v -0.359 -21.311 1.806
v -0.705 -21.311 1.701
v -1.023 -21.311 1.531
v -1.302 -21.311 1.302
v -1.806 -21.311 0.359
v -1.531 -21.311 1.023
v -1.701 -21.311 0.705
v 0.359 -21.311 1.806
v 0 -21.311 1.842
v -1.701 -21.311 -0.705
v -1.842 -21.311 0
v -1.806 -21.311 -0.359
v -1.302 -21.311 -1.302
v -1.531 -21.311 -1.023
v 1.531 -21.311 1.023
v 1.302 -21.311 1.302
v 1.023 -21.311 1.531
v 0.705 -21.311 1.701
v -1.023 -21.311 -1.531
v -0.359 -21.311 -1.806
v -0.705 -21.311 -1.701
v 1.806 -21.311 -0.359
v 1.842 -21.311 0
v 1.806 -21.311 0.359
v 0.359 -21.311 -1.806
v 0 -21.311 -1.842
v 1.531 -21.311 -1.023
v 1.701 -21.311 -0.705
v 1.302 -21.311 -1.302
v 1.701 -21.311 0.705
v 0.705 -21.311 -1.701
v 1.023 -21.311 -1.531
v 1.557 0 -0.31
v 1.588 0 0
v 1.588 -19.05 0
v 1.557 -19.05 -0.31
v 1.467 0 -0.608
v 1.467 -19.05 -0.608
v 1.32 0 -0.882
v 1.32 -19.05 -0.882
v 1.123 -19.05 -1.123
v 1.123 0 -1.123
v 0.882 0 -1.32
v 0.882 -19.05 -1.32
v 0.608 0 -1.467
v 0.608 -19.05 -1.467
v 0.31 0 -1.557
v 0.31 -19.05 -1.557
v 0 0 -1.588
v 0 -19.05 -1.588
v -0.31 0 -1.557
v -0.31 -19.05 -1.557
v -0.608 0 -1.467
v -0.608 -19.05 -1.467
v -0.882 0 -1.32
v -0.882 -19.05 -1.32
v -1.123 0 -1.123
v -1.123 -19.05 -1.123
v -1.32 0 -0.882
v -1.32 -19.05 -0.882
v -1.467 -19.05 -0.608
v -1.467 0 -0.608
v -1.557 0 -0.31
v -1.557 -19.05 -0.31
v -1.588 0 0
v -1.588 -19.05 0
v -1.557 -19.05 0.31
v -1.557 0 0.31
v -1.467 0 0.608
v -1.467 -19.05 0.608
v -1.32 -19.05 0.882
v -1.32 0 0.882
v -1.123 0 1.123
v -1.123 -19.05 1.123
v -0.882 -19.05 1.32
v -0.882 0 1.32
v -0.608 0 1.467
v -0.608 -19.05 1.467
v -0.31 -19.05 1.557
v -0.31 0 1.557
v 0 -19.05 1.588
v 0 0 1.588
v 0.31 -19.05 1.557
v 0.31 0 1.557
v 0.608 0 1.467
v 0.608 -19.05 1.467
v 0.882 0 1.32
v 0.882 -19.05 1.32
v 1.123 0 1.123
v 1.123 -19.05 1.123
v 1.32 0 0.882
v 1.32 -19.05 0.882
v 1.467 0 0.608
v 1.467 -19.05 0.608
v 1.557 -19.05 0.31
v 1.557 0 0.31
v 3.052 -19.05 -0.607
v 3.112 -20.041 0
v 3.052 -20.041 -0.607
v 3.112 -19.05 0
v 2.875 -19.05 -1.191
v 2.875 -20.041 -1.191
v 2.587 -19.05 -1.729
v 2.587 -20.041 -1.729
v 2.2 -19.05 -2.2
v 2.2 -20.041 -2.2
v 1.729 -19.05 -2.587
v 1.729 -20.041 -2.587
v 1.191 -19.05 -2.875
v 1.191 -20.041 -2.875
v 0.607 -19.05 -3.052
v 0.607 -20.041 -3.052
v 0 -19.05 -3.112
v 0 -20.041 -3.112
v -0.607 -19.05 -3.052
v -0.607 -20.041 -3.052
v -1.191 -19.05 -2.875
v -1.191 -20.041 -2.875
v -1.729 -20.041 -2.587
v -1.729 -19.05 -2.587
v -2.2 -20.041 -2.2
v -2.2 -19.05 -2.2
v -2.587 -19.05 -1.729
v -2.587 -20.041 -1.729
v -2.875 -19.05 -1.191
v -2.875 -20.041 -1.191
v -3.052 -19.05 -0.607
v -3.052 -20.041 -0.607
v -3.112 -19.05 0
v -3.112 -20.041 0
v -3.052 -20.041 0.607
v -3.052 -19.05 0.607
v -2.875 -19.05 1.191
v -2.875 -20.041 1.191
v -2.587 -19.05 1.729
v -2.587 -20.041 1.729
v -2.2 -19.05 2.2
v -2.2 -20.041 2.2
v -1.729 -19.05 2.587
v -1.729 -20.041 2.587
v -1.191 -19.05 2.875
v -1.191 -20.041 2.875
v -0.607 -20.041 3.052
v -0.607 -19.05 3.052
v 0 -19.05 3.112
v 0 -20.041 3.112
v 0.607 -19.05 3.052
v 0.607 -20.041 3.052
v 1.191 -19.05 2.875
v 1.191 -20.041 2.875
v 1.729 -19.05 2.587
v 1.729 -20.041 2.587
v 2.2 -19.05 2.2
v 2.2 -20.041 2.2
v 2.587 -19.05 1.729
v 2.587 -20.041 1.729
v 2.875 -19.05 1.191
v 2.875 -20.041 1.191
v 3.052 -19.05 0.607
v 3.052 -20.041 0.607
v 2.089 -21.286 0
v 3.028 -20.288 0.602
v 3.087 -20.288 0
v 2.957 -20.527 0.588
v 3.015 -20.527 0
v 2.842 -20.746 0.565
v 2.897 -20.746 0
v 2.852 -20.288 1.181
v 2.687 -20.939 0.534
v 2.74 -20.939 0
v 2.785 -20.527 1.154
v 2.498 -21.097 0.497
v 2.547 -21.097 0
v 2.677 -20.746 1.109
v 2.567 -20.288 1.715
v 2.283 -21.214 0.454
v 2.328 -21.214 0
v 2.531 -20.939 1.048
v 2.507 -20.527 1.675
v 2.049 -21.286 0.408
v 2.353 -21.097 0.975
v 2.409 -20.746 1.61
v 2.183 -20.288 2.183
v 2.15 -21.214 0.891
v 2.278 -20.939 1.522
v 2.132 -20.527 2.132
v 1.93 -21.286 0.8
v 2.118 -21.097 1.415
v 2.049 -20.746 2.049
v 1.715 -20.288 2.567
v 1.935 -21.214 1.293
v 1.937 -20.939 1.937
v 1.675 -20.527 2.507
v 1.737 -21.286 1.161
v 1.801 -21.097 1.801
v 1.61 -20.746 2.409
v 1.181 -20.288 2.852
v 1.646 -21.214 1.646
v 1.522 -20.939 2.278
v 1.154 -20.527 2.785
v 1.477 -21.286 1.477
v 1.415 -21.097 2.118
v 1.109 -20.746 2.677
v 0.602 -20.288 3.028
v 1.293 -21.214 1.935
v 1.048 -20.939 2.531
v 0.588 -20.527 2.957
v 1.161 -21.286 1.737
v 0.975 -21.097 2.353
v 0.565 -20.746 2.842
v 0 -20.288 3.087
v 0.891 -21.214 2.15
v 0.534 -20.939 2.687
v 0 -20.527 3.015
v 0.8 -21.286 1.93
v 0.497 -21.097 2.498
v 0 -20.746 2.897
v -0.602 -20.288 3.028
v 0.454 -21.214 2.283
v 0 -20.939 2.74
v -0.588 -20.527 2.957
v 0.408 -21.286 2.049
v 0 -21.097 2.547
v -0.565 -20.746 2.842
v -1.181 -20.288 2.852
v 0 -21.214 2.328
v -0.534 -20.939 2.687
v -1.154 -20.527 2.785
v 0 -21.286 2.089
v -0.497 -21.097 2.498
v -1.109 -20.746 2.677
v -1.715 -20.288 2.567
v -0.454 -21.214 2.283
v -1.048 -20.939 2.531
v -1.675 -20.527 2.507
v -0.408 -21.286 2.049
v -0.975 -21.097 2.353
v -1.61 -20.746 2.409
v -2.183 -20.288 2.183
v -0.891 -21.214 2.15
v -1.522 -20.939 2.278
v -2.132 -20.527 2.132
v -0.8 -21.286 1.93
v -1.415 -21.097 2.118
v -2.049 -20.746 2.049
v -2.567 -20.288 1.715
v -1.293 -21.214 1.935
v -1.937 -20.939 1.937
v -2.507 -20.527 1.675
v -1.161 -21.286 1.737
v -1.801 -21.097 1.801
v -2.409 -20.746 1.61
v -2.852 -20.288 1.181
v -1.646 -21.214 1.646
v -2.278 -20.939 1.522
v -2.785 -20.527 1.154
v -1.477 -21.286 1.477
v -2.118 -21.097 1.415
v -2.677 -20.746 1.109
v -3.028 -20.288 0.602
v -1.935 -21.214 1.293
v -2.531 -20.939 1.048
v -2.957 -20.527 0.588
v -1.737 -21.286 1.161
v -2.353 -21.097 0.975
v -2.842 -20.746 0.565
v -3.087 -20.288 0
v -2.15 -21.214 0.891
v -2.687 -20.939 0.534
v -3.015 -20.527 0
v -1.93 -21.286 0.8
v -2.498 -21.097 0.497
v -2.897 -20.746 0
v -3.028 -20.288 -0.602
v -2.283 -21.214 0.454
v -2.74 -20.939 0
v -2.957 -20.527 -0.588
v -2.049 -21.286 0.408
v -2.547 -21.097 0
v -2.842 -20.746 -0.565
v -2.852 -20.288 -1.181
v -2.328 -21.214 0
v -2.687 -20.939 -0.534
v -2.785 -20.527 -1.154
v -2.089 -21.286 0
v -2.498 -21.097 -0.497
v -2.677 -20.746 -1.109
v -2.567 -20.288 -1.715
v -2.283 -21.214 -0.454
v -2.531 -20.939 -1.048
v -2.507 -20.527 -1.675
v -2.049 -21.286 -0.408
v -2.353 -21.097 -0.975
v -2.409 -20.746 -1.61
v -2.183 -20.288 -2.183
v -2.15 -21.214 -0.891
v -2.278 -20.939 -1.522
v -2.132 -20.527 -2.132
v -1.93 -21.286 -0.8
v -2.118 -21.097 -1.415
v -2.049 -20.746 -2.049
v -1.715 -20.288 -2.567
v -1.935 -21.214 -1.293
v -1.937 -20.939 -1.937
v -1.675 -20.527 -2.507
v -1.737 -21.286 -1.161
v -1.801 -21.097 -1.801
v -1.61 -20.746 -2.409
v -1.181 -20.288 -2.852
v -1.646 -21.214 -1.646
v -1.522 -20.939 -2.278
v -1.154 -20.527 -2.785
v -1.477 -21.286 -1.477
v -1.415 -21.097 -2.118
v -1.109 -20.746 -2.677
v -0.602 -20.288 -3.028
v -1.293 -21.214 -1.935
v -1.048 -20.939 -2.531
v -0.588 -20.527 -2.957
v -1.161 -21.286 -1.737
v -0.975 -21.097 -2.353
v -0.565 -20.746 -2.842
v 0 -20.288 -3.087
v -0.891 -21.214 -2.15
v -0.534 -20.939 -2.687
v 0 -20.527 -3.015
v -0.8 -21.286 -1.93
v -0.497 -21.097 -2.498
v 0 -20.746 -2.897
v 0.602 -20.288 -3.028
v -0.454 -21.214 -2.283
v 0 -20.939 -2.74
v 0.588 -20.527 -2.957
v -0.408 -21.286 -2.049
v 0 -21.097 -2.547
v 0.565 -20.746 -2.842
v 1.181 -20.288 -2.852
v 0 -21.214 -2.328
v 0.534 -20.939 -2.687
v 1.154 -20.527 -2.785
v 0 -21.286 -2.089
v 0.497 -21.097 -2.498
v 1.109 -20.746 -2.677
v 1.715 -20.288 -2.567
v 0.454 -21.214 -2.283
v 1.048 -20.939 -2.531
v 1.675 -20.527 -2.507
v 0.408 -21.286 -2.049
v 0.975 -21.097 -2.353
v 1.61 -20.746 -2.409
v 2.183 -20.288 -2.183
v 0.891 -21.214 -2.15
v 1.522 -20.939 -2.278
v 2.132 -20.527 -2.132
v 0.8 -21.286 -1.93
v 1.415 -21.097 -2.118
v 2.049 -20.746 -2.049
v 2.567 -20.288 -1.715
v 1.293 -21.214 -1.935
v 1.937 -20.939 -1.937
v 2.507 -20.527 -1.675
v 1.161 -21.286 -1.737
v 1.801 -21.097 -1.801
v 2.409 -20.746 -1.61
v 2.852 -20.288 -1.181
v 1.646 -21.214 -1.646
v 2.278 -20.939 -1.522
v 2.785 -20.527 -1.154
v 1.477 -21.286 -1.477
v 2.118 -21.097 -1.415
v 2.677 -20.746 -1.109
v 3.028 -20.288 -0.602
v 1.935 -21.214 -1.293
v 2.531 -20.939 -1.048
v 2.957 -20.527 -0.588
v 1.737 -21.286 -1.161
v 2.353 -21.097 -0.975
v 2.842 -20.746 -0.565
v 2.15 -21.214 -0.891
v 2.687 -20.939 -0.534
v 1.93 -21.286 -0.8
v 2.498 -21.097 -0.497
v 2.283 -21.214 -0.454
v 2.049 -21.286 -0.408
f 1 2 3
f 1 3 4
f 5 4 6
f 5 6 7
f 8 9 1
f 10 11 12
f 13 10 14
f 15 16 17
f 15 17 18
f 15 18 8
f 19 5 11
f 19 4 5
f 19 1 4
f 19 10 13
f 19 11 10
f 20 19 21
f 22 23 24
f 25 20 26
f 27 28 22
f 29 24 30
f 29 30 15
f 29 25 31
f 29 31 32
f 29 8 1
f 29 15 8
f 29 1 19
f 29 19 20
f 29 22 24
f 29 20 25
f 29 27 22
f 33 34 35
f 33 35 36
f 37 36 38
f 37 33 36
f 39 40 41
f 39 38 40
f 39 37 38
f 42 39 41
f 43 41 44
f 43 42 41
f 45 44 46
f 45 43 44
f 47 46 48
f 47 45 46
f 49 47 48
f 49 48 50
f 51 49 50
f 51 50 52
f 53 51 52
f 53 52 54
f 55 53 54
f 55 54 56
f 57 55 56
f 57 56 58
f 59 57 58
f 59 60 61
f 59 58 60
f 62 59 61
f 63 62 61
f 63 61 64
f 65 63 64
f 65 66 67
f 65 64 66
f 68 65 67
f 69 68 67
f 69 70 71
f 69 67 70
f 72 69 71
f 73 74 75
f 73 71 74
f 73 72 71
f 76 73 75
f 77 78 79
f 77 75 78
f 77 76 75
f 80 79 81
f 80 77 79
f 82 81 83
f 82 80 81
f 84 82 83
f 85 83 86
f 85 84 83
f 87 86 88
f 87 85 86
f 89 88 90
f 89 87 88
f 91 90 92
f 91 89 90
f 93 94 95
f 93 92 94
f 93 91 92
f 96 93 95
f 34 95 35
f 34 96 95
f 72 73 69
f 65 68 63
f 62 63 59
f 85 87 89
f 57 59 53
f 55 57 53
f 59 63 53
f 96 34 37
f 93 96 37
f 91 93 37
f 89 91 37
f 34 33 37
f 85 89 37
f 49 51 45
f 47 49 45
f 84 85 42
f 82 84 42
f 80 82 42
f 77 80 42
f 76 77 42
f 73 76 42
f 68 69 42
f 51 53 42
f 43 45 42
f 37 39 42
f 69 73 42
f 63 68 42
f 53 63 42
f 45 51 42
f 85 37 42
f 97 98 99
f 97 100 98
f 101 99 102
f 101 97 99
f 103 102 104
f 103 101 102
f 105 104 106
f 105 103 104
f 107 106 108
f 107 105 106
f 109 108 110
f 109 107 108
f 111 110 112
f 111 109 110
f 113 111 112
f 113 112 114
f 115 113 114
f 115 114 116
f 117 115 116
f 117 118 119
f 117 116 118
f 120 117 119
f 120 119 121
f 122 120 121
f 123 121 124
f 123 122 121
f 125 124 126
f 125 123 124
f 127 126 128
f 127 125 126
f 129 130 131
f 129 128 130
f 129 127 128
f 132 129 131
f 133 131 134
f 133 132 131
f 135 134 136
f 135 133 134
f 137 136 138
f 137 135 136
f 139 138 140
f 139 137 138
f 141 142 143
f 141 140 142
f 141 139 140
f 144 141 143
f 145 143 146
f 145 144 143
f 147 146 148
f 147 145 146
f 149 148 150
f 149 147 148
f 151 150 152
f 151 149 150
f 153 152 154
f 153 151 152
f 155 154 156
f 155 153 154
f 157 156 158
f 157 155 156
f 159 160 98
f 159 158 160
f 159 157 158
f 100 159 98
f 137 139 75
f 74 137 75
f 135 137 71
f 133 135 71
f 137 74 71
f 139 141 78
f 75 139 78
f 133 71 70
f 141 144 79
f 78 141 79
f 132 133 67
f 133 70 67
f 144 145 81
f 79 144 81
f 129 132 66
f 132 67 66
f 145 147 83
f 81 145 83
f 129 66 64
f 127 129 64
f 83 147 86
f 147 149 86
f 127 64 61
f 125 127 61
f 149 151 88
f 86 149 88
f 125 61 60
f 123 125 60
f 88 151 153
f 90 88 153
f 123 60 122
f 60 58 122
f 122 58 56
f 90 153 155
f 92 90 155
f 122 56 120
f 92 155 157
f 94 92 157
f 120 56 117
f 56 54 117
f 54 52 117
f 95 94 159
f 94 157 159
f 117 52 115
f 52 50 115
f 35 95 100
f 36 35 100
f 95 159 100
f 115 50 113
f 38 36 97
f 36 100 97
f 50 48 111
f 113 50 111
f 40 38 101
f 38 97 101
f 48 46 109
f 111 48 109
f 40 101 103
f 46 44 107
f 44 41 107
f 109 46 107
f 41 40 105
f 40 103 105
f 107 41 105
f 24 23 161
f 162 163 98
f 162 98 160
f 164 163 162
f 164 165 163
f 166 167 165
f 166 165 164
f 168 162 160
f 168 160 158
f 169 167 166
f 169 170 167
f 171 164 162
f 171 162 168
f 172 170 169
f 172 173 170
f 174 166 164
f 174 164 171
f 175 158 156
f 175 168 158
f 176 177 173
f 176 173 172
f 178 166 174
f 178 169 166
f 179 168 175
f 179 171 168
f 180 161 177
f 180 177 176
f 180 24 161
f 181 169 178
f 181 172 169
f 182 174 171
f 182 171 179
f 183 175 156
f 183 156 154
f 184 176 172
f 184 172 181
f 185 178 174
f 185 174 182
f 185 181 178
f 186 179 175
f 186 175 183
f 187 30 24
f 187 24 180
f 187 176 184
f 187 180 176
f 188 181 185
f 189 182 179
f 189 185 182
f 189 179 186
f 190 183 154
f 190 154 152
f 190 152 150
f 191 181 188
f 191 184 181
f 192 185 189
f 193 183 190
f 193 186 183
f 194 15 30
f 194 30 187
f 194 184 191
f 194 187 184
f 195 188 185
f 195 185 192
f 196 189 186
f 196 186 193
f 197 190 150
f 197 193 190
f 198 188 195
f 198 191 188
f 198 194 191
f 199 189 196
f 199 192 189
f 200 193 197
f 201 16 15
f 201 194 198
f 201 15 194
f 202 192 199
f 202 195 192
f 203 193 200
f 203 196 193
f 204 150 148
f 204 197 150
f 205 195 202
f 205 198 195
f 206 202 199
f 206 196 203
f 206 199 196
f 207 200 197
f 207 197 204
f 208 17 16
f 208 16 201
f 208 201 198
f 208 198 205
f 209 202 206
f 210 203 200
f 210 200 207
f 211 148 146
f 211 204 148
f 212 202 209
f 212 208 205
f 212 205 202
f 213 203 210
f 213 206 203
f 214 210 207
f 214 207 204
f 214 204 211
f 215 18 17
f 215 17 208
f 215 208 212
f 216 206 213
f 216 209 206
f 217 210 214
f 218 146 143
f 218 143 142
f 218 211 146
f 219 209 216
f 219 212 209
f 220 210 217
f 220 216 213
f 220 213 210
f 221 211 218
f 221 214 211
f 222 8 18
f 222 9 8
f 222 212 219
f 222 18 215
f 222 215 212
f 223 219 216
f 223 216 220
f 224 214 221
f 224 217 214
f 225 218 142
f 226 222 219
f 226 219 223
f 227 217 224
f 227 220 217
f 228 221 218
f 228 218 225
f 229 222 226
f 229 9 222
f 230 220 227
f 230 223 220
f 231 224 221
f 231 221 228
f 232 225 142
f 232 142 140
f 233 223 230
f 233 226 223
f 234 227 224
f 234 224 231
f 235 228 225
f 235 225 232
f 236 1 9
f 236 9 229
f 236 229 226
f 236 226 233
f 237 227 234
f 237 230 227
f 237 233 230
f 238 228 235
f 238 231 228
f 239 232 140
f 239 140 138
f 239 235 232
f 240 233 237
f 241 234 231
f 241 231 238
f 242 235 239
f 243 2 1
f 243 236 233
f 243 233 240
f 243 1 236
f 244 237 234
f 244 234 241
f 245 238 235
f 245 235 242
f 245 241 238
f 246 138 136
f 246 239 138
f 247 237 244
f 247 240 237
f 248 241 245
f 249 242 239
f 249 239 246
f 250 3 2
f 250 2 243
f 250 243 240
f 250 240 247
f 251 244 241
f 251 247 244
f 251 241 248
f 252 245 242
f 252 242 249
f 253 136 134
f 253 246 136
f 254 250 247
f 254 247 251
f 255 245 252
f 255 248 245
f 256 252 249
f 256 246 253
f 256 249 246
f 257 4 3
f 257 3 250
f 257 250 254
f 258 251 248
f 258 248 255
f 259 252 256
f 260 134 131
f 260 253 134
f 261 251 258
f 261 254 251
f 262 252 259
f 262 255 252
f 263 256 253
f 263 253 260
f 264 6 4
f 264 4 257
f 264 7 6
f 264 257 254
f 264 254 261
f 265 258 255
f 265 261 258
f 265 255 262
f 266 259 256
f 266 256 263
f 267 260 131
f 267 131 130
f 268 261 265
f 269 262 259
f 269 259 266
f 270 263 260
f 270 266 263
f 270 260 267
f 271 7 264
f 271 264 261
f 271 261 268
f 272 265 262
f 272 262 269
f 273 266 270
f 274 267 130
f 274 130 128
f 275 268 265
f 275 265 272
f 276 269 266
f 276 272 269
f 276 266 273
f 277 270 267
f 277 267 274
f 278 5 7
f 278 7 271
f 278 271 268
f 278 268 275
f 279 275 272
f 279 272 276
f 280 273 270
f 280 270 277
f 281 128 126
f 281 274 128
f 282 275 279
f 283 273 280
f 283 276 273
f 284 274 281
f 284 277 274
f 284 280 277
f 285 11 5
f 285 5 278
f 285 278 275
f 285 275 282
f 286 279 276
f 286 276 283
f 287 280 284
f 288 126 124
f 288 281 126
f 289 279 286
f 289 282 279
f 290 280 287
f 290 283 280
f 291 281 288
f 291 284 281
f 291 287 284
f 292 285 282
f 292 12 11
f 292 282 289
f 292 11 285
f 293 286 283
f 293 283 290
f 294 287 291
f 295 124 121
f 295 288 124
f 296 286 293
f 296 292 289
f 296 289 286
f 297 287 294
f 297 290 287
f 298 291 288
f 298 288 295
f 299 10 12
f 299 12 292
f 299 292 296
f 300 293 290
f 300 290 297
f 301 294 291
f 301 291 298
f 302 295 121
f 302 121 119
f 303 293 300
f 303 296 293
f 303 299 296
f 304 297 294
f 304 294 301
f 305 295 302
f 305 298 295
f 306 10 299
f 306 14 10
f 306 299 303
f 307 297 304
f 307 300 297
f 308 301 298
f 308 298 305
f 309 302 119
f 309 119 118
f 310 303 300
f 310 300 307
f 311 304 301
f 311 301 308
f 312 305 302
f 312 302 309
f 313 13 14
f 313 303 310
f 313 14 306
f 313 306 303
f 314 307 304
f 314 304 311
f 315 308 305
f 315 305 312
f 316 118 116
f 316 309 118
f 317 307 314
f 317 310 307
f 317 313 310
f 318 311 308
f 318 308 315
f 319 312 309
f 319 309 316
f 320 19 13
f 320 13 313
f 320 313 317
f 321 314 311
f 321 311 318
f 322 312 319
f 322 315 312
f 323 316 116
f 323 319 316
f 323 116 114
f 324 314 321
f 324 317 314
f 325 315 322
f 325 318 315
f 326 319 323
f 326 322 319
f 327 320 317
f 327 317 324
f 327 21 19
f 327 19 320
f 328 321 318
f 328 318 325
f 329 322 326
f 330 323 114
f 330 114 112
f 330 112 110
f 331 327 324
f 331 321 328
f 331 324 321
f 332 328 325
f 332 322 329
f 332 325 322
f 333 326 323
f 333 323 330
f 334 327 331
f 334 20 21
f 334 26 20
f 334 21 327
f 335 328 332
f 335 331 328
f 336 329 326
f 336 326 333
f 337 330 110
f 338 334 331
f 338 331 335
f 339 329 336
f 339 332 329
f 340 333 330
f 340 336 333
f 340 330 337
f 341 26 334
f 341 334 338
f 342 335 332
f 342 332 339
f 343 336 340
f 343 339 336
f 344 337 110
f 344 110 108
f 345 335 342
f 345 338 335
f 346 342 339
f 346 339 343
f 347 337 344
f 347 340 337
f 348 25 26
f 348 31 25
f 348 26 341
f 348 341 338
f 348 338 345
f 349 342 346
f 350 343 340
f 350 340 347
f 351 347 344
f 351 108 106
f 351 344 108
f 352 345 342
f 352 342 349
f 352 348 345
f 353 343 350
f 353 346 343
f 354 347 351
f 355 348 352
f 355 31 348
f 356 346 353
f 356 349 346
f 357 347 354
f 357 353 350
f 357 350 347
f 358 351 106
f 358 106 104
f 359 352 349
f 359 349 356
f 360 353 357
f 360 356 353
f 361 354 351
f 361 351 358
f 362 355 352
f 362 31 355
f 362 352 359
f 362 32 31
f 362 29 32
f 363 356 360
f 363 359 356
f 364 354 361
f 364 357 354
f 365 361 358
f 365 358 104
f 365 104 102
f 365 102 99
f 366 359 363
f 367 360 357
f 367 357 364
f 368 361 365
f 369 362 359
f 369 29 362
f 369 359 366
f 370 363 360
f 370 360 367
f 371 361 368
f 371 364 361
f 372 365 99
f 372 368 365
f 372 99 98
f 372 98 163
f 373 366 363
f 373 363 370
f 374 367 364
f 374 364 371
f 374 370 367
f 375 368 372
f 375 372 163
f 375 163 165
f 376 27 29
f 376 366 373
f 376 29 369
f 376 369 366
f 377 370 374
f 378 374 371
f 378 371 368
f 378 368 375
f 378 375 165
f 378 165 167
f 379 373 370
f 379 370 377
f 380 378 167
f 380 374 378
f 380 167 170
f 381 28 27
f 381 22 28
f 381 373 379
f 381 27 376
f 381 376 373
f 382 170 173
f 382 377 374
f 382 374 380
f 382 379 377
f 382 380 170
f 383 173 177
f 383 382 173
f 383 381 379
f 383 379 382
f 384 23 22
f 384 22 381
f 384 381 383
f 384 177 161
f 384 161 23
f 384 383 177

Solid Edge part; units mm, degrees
sketch "Sketch1" plane through (0, 0, 0) normal (0, -1, 0) x (1, 0, 0)
  circle A0 centre (0, 0) radius 1.5875
extrude "Protrusion1" add sketch "Sketch1" along normal blind 19.05
sketch "Sketch2" plane through (0, -19.05, 0) normal (0, -1, 0) x (1, 0, 0)
  circle A0 centre (0, 0) radius 3.1115
extrude "ExtrudedProtrusion_2" add sketch "Sketch2" along normal blind 2.2606
fillet "Round_1" radius 1.27 1 edges at (-3.1115, -21.3106, 0)
cosmetic_thread "Thread1" size "#5-40 UNC"
properties part number "90272A130"
